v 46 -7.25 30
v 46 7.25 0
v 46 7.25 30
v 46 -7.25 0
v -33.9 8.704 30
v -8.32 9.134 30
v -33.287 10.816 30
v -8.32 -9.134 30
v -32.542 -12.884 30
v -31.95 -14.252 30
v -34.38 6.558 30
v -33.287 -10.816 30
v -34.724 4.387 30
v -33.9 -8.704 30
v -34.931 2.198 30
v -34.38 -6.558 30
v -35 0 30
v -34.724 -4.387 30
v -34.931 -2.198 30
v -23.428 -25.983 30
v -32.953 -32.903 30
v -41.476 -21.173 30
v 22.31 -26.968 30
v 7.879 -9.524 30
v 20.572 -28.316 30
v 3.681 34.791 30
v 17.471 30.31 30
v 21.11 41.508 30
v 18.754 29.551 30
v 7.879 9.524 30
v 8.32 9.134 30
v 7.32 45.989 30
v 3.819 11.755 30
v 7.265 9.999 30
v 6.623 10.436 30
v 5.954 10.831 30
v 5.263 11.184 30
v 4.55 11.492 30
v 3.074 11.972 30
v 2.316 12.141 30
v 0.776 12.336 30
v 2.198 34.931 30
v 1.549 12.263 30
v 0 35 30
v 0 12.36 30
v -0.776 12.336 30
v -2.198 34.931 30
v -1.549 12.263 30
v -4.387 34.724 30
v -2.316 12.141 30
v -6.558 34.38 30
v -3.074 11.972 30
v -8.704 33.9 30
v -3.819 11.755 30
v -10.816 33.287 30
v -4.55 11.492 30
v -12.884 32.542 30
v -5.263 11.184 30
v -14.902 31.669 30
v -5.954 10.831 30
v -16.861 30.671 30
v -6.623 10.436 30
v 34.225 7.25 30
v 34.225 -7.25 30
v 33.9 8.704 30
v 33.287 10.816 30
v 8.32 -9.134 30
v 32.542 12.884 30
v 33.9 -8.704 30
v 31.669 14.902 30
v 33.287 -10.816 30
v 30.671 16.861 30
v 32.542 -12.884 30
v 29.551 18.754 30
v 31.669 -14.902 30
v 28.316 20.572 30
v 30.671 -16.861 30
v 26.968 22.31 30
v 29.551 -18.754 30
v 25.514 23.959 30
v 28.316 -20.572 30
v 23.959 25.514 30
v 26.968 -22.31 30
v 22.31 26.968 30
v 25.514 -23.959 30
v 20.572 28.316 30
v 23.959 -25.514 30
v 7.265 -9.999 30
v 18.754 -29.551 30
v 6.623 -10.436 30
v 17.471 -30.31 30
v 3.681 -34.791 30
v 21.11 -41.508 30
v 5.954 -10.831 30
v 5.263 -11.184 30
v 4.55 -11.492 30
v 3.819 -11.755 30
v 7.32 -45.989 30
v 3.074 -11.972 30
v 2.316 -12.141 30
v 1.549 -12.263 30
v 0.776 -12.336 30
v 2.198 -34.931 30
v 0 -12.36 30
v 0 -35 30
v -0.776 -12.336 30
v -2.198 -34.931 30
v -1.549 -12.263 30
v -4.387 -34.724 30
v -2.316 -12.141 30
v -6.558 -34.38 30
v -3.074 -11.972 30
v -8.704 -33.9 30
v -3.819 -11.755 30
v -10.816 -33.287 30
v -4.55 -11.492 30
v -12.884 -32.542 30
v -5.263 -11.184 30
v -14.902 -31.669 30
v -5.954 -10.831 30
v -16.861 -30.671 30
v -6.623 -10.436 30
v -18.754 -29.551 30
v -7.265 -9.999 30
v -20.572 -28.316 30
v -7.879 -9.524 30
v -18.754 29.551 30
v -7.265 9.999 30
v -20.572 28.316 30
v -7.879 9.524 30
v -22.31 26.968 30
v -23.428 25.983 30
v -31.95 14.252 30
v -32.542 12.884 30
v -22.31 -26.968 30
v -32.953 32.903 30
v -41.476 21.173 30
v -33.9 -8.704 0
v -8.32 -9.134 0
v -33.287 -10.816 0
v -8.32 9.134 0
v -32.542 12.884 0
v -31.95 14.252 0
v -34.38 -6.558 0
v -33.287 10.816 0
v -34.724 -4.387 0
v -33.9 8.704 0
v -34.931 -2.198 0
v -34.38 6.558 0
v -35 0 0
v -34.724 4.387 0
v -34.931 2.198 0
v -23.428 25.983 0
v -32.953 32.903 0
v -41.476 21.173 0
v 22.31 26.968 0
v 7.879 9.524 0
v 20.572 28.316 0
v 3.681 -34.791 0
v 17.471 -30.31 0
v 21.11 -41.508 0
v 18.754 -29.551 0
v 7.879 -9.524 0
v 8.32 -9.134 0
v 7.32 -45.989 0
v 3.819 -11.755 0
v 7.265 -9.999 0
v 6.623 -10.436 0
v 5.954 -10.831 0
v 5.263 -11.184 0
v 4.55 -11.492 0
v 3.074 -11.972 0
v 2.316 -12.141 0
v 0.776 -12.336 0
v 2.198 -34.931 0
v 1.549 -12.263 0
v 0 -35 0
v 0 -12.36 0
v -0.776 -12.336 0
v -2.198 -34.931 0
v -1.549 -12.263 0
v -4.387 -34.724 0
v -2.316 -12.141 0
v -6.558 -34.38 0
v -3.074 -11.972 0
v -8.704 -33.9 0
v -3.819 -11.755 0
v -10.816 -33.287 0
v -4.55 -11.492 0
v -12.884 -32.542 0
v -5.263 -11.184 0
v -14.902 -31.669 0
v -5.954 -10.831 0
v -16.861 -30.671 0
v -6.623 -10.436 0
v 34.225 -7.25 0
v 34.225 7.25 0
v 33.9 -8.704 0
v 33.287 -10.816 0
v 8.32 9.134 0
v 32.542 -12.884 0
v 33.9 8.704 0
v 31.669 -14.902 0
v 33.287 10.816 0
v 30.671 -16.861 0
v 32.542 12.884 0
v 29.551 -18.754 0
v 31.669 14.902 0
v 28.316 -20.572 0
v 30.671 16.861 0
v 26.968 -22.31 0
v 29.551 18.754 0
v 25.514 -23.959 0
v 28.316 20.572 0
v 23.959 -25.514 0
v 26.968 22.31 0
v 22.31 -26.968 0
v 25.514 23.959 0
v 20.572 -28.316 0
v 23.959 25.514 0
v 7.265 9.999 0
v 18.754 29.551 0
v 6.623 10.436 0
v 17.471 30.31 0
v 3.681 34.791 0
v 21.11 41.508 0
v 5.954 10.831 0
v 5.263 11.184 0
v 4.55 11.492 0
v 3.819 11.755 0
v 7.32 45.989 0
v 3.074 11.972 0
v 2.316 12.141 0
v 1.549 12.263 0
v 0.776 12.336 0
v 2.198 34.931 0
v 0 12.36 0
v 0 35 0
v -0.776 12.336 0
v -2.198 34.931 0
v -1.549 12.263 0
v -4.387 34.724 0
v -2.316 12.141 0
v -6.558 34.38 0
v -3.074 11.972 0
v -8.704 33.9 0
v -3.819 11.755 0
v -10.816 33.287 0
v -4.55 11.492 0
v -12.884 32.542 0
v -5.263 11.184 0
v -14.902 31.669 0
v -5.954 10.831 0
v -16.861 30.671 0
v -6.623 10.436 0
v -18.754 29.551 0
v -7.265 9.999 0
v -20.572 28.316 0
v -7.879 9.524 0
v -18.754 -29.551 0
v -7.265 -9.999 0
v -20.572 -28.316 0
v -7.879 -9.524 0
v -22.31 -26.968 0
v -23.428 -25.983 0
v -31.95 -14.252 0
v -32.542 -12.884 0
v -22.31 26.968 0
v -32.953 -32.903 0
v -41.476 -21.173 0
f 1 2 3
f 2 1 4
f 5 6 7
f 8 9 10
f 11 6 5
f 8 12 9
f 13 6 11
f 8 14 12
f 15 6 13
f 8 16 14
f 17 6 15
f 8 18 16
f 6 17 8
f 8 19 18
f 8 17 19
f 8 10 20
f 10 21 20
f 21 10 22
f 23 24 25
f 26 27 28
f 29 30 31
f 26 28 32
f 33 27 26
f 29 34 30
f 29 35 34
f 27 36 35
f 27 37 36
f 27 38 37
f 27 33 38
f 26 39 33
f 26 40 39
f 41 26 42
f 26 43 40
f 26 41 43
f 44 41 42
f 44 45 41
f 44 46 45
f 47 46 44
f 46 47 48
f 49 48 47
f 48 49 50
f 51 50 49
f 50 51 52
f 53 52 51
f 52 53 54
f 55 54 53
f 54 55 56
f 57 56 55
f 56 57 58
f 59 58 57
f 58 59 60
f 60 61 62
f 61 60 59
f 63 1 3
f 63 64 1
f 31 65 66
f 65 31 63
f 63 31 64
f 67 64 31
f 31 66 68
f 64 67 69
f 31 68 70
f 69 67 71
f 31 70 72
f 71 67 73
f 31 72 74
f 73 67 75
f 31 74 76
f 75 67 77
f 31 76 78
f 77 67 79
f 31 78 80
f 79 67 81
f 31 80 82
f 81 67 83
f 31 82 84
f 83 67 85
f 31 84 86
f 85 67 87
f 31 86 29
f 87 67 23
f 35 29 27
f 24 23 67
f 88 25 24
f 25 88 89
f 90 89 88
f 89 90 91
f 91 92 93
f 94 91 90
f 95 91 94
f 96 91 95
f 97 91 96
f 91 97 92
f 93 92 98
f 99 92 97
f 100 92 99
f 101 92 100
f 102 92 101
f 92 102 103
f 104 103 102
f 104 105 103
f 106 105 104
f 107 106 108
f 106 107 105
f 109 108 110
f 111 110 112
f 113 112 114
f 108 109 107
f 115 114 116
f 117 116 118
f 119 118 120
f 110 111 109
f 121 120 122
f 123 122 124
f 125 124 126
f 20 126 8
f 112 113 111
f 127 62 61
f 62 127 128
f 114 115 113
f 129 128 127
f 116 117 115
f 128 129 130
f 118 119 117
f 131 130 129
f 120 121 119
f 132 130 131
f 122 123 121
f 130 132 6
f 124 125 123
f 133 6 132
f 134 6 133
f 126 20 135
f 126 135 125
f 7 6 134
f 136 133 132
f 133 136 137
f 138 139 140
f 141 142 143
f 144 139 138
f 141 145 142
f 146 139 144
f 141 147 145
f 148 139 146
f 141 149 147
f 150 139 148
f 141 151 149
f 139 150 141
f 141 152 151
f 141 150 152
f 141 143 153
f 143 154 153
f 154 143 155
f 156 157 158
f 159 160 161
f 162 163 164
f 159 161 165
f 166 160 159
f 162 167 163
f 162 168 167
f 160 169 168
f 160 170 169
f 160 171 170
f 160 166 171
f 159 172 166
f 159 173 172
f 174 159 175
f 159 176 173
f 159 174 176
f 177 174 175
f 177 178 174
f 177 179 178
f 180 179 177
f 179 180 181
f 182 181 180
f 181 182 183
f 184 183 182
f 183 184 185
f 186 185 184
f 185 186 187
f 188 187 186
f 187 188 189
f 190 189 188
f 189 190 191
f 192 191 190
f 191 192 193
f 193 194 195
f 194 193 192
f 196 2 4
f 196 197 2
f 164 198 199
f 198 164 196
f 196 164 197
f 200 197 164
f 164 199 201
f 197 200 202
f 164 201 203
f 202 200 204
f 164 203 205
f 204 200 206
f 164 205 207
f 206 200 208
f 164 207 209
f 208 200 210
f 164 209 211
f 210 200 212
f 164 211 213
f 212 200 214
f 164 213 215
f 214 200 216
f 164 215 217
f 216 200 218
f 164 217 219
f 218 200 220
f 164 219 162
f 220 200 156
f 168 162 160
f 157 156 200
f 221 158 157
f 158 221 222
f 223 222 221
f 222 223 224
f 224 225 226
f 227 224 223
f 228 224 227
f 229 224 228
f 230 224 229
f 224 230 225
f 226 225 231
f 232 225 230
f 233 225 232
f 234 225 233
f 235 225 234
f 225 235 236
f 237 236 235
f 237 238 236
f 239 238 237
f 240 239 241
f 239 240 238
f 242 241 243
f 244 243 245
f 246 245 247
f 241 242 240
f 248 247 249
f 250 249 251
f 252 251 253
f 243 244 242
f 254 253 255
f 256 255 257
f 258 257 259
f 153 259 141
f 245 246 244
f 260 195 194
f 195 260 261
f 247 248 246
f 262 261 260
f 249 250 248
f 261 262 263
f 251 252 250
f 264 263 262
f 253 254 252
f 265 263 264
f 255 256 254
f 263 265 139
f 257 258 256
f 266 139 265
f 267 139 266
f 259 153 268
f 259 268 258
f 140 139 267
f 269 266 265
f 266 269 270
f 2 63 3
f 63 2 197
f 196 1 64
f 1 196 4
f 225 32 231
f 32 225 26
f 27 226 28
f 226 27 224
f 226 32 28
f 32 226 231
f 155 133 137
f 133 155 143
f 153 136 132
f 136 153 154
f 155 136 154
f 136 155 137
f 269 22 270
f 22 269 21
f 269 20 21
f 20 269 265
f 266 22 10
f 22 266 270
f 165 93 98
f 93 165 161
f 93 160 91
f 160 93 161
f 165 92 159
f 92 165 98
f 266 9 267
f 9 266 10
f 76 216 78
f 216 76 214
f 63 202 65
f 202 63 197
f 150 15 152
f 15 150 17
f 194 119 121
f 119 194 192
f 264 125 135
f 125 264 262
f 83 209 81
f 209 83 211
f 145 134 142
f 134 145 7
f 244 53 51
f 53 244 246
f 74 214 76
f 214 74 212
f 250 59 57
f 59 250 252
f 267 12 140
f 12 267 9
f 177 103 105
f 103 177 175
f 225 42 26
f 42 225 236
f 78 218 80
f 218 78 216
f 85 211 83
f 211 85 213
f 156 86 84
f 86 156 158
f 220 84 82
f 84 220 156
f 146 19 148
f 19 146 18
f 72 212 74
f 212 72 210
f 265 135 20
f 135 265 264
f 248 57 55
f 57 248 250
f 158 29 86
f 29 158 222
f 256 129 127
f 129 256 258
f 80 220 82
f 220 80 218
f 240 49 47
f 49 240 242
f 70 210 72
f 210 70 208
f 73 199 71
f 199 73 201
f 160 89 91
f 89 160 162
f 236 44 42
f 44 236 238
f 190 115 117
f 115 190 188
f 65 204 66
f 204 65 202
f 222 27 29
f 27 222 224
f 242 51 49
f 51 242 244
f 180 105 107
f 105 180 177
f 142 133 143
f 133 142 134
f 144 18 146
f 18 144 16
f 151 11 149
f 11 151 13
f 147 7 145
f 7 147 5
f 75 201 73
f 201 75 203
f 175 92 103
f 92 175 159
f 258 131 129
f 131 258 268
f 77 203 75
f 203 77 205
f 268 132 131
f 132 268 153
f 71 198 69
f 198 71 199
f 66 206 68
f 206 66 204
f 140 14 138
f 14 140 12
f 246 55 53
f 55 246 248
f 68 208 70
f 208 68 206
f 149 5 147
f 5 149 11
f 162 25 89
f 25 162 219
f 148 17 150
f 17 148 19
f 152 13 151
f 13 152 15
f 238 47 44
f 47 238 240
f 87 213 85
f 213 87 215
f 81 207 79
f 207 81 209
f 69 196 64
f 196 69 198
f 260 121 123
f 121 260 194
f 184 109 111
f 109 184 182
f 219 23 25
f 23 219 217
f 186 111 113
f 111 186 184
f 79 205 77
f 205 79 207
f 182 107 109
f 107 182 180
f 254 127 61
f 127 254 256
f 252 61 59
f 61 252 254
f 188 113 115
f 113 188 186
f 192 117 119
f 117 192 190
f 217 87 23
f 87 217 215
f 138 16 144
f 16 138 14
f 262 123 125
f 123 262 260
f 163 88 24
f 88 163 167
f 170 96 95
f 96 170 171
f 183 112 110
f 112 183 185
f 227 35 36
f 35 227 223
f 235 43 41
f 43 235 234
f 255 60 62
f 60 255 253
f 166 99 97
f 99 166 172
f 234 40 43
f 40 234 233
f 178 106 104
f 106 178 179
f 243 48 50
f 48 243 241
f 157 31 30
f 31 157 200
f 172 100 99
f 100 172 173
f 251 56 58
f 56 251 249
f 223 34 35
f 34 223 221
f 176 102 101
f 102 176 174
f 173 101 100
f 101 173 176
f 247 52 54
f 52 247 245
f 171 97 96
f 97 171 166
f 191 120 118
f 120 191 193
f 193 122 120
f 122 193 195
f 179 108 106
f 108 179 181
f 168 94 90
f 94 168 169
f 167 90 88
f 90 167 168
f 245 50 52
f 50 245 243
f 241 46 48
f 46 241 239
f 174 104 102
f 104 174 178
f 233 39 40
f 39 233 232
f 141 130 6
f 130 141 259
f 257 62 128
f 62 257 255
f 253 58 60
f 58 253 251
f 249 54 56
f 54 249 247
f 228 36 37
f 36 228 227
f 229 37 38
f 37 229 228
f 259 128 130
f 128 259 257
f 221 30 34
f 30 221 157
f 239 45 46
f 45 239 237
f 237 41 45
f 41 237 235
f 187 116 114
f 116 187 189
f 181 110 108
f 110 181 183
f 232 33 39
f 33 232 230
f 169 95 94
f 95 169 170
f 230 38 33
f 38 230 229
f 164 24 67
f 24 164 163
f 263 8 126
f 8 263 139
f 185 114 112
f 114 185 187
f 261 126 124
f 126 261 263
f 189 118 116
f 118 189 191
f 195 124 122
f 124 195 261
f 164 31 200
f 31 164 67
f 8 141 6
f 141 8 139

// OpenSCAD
d_aussen = 92;
d_innen = 70;
hoehe = 30;

n_zapfen = 5;
breite_zapfen = 14.5;

dummy = 0.1;

$fn = 100;

difference() {
    union() {
        for(a=[0:360/n_zapfen:360]) {
            rotate([0,0,a]) {
                translate([0,-breite_zapfen/2,0])
                    cube([d_aussen/2, breite_zapfen, hoehe]);
            }
        }
        cylinder(r=d_innen/2, h=hoehe);
    }
    intersection() {
        translate([0,0,-dummy]) cylinder(r=(24*1.03)/2, h=hoehe+2*dummy);
        translate([-(16*1.04)/2, -(24*1.03)/2, -dummy]) cube([(16*1.04), (24*1.03), hoehe+2*dummy]);
    }
}
